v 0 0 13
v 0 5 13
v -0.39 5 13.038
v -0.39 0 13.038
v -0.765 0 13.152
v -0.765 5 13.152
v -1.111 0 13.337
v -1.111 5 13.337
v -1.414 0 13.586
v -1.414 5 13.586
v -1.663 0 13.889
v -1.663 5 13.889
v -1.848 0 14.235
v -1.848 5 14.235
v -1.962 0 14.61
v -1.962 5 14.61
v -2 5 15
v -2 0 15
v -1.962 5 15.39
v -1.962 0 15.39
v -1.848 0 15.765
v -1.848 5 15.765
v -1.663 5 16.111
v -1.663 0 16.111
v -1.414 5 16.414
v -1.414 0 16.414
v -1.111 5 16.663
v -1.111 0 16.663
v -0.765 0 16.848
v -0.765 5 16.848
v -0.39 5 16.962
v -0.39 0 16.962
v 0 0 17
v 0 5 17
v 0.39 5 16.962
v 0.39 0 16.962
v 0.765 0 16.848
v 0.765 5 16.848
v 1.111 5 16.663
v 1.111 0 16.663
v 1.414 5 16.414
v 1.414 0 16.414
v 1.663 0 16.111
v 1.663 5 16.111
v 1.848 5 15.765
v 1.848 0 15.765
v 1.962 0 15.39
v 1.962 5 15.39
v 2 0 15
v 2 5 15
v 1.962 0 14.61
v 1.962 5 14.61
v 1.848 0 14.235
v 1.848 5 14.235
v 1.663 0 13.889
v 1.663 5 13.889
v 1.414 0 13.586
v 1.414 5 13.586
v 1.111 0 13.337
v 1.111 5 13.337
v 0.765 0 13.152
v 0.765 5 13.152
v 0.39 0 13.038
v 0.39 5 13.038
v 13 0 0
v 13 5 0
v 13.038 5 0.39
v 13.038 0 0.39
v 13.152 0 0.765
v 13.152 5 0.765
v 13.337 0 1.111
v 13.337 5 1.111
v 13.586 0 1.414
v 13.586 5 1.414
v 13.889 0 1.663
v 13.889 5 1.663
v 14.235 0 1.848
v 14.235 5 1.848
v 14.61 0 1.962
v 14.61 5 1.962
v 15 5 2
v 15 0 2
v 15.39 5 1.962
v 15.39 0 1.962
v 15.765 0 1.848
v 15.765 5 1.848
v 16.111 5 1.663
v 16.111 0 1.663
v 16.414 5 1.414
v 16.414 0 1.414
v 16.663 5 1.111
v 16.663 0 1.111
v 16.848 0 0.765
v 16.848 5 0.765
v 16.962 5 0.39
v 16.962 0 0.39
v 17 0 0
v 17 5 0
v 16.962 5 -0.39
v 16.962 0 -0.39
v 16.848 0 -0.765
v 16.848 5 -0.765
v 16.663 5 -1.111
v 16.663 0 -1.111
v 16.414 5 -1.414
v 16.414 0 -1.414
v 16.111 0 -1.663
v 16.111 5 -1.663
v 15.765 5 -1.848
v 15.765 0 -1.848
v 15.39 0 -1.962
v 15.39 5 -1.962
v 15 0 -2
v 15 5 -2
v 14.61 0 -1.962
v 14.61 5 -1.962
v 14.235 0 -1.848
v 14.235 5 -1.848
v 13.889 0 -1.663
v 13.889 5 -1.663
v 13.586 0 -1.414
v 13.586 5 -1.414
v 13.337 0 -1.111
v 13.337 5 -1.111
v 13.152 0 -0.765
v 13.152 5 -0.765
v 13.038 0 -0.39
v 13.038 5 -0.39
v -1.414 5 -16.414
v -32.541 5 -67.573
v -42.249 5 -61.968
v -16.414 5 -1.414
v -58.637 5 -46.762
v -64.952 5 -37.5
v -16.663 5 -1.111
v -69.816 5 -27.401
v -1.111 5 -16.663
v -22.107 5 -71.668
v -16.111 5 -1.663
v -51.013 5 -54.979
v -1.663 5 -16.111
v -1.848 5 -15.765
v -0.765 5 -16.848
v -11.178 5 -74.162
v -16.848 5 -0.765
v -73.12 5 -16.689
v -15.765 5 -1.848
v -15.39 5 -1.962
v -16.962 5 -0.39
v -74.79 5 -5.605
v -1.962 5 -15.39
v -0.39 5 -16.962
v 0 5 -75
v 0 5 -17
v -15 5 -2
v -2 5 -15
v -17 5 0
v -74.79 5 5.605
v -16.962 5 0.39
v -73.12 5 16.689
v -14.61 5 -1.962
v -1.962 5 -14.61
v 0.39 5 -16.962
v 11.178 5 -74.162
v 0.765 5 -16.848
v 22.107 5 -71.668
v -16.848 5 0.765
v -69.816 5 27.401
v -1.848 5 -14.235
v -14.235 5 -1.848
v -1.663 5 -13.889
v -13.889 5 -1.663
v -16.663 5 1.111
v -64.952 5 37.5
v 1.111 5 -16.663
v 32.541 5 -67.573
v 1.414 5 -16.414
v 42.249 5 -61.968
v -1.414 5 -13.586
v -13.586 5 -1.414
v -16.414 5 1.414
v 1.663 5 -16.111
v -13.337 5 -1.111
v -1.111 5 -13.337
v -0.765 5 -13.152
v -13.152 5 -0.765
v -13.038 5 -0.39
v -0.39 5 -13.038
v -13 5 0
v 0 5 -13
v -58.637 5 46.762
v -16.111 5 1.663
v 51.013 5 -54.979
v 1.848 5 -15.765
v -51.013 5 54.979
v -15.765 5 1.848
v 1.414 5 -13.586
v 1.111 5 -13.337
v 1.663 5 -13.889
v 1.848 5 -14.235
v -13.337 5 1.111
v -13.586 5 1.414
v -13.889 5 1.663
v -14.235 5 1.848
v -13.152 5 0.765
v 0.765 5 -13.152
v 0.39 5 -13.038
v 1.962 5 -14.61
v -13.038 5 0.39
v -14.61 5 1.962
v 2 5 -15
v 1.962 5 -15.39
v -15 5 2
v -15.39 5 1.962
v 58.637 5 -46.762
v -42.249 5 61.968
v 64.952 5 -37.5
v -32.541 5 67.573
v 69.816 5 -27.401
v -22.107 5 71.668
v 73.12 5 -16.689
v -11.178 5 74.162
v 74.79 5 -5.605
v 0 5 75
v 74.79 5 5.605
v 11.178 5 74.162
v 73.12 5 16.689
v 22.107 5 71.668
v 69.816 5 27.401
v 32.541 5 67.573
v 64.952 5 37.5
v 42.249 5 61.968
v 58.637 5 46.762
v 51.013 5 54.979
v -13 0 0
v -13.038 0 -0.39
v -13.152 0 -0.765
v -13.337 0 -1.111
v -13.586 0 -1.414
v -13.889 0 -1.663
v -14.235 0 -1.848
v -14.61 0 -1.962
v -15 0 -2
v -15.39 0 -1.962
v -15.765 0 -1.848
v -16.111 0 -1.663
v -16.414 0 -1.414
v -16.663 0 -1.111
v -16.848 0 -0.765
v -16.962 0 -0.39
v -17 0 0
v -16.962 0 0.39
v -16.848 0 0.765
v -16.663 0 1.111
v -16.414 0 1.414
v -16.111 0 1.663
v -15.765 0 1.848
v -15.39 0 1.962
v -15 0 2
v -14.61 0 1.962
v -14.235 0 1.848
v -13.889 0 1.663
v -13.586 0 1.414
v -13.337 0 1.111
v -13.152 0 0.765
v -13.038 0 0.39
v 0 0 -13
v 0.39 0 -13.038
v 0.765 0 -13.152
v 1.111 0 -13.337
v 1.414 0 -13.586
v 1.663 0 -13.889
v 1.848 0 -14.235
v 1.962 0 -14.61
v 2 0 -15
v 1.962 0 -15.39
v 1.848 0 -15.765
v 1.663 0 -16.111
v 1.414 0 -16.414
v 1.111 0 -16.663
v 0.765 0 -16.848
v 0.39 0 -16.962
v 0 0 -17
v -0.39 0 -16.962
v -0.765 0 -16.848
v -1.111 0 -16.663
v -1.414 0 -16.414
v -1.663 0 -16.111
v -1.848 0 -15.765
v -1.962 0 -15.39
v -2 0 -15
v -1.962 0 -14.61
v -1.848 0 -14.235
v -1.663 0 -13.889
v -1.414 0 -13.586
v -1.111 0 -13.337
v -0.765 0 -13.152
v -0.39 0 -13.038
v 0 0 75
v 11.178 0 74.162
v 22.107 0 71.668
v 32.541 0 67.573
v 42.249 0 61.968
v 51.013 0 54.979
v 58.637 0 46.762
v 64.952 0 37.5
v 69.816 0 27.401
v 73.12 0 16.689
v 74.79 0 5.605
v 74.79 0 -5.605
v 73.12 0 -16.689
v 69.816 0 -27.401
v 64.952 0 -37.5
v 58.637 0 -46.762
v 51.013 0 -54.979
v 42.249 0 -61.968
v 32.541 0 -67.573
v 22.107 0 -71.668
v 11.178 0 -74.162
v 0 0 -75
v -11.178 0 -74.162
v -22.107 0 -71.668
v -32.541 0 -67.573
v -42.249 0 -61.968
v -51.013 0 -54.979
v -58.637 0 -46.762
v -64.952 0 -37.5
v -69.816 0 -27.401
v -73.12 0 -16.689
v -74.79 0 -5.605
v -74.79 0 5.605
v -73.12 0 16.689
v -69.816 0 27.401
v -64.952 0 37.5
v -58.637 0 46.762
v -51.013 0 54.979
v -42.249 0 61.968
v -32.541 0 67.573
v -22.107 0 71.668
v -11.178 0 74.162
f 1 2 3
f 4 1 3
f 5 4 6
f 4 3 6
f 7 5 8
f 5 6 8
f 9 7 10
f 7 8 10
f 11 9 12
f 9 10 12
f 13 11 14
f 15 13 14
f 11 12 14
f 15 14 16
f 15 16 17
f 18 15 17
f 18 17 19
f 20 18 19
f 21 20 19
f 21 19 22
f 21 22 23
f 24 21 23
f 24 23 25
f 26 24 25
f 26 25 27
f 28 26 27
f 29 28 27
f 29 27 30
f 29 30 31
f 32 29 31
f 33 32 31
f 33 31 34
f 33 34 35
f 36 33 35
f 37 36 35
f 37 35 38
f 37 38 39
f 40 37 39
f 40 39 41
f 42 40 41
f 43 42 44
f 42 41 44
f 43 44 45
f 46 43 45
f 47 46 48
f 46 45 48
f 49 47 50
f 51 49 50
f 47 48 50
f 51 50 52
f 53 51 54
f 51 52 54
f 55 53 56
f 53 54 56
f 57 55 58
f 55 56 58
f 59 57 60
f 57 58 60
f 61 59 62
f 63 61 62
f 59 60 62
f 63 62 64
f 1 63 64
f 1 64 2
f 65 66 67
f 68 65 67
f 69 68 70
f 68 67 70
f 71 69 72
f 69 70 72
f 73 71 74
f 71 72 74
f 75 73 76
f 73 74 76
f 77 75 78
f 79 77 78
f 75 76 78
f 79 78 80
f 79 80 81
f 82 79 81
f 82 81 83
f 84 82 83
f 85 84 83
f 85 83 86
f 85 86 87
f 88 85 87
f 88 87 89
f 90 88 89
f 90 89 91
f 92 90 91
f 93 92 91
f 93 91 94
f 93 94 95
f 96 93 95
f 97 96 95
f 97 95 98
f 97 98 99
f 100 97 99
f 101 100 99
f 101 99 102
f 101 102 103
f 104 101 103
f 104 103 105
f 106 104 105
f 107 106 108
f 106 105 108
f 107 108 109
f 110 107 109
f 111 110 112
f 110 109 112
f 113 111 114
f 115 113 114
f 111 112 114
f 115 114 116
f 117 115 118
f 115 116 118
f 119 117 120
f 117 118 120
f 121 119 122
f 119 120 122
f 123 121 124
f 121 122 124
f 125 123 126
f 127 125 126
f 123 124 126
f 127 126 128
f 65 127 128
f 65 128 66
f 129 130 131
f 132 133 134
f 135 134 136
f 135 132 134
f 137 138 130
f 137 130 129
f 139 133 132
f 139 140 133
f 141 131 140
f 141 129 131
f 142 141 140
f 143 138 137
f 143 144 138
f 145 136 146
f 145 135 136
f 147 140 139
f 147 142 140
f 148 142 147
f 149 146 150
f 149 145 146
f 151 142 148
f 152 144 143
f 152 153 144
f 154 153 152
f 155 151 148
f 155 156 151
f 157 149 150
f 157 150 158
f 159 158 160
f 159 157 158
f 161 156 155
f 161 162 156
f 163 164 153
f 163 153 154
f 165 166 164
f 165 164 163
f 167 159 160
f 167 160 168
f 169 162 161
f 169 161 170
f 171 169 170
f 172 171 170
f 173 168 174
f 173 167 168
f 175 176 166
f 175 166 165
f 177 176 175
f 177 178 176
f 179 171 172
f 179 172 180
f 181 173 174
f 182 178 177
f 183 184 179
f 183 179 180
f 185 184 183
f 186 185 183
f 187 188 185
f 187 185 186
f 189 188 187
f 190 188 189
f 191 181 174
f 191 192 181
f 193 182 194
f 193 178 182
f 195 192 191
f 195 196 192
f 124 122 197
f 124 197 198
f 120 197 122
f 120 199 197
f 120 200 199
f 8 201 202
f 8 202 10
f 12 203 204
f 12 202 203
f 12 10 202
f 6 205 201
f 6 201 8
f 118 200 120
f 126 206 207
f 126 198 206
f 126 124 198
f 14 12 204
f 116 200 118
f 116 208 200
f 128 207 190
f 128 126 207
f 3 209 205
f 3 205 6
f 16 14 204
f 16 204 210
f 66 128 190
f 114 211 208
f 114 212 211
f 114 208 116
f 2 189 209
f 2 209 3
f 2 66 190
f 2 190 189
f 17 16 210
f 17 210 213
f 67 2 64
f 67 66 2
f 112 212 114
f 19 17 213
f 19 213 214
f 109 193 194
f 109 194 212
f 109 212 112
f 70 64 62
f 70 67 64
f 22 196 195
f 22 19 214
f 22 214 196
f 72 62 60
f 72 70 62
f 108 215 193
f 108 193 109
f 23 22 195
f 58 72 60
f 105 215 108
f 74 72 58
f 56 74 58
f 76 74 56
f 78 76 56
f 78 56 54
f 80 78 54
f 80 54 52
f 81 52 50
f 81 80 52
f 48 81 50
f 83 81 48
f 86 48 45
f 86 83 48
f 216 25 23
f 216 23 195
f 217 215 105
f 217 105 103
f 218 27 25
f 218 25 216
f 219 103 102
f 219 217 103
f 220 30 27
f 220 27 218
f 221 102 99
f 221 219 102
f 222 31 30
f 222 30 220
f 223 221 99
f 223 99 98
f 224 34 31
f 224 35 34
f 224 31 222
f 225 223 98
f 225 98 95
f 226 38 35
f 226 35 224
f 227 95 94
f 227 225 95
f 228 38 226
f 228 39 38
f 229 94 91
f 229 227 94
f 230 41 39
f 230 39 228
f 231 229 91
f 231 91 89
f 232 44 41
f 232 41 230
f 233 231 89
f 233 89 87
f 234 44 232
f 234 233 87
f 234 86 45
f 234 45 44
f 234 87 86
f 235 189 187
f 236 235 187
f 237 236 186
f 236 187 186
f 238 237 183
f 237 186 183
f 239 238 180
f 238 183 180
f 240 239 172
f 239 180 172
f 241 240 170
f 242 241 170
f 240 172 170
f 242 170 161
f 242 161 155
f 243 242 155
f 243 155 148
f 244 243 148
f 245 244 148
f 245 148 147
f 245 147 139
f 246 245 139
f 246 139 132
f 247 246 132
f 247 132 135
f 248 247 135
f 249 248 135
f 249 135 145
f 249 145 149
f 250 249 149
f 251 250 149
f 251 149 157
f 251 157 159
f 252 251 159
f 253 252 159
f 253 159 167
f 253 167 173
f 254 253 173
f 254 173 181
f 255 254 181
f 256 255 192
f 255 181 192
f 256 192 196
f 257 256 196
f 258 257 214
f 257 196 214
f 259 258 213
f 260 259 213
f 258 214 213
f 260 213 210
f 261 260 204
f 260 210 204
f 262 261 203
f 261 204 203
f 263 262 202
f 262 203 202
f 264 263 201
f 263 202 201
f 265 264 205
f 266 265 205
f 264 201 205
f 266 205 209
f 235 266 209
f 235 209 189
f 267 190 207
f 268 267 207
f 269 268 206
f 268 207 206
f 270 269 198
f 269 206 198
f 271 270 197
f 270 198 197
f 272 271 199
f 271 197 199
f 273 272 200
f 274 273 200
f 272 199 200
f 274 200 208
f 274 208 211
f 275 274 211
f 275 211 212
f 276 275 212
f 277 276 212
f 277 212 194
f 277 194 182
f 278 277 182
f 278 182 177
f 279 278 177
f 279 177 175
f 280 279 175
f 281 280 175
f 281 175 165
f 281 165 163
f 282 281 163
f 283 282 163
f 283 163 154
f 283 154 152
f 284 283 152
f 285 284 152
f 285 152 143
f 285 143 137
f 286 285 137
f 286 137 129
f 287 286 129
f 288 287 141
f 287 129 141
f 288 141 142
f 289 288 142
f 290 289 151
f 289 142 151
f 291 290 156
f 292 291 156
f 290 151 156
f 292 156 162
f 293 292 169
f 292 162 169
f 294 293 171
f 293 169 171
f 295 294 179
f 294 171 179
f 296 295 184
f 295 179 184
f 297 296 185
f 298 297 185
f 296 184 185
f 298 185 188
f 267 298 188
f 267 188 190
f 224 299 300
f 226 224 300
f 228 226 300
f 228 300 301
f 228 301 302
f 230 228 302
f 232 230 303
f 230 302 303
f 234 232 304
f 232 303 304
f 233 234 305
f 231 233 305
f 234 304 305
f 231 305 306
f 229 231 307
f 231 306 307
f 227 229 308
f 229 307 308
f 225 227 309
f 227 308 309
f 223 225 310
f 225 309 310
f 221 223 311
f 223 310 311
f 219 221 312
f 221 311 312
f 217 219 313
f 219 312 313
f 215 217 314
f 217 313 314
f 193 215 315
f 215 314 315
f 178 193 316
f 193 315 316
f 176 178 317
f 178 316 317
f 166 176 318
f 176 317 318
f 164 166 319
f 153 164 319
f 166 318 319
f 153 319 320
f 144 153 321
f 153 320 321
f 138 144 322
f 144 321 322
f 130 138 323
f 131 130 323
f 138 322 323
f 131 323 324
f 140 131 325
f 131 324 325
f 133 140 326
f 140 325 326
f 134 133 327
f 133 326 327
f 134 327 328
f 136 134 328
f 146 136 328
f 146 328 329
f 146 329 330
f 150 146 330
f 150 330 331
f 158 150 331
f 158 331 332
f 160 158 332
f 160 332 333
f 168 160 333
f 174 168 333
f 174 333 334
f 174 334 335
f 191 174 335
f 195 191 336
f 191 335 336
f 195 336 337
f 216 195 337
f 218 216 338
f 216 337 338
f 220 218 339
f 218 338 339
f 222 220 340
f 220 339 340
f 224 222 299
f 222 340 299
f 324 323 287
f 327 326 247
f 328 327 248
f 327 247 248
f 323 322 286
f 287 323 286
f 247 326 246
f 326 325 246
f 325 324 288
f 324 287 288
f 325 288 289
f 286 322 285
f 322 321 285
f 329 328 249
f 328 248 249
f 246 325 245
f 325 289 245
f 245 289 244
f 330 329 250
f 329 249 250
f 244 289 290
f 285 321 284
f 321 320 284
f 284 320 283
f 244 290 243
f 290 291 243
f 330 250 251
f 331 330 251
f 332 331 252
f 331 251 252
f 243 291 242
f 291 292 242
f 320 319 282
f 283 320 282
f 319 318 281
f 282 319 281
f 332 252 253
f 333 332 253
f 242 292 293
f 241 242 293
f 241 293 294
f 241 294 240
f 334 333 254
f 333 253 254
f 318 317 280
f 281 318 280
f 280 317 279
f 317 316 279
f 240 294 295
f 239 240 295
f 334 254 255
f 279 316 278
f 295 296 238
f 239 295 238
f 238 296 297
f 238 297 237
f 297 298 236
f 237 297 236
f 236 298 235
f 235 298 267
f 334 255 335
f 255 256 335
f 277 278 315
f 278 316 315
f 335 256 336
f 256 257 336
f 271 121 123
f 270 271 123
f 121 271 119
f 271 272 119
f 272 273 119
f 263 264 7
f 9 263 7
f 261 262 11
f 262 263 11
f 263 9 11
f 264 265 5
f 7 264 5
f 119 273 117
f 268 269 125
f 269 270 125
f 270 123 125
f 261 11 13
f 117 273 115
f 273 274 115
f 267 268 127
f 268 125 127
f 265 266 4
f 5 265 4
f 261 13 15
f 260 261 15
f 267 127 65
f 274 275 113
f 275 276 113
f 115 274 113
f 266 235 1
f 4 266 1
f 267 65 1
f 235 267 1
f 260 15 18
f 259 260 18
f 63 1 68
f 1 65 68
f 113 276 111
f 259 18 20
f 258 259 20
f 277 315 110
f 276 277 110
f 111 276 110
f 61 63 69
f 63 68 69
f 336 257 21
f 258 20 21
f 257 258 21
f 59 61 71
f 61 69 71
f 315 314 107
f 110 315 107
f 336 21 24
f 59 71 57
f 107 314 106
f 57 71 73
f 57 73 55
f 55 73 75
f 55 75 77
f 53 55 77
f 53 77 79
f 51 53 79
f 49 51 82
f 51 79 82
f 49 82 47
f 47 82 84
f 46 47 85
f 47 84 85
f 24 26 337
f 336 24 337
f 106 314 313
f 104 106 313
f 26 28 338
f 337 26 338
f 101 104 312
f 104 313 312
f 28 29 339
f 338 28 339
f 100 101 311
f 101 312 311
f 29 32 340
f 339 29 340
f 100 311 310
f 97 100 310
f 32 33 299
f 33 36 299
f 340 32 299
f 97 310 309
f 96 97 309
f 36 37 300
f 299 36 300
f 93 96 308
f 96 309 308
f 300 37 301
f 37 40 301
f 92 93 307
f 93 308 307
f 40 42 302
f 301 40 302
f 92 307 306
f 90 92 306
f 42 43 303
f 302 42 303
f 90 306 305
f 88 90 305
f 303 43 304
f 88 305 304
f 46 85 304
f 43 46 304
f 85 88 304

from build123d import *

# Parameters (mm, degrees)
SKETCH1_R           = 75
BOSS_EXTRUDE1_DEPTH = 5
CUT_EXTRUDE1_REACH  = 108.184
SKETCH2_R           = 2
CIRPATTERN1_COUNT   = 4


with BuildPart() as part:
    # Sketch1 → Boss-Extrude1 (new body)
    with BuildSketch(Plane(origin=(0, 0, 0), x_dir=(1, 0, 0), z_dir=(0, 1, 0))):
        with Locations(Location((0, 0, 0), (0, 0, 270))):
            Circle(SKETCH1_R)
    extrude(amount=BOSS_EXTRUDE1_DEPTH)

    # Sketch2 → Cut-Extrude1 (cut, up to next)
    with BuildSketch(Plane(origin=(0, 5, 0), x_dir=(1, 0, 0), z_dir=(0, 1, 0)), mode=Mode.PRIVATE) as cut_extrude1_sk1:
        with Locations(Location((0, 15, 0), (0, 0, 270))):
            Circle(SKETCH2_R)
    cut_extrude1_tool1 = extrude(cut_extrude1_sk1.sketch, amount=-CUT_EXTRUDE1_REACH, mode=Mode.PRIVATE) & part.part
    cut_extrude1 = cut_extrude1_tool1.solids().sort_by_distance((0, 5, -15))[0]
    add(cut_extrude1, mode=Mode.SUBTRACT)

    # CirPattern1: Cut-Extrude1 ×4 about axis
    cirpattern1_axis = Axis((0, 0, 0), (0, 1, 0))
    for i in range(1, CIRPATTERN1_COUNT):
        add(cut_extrude1.rotate(cirpattern1_axis, i * 360 / CIRPATTERN1_COUNT), mode=Mode.SUBTRACT)


solid = part.part
